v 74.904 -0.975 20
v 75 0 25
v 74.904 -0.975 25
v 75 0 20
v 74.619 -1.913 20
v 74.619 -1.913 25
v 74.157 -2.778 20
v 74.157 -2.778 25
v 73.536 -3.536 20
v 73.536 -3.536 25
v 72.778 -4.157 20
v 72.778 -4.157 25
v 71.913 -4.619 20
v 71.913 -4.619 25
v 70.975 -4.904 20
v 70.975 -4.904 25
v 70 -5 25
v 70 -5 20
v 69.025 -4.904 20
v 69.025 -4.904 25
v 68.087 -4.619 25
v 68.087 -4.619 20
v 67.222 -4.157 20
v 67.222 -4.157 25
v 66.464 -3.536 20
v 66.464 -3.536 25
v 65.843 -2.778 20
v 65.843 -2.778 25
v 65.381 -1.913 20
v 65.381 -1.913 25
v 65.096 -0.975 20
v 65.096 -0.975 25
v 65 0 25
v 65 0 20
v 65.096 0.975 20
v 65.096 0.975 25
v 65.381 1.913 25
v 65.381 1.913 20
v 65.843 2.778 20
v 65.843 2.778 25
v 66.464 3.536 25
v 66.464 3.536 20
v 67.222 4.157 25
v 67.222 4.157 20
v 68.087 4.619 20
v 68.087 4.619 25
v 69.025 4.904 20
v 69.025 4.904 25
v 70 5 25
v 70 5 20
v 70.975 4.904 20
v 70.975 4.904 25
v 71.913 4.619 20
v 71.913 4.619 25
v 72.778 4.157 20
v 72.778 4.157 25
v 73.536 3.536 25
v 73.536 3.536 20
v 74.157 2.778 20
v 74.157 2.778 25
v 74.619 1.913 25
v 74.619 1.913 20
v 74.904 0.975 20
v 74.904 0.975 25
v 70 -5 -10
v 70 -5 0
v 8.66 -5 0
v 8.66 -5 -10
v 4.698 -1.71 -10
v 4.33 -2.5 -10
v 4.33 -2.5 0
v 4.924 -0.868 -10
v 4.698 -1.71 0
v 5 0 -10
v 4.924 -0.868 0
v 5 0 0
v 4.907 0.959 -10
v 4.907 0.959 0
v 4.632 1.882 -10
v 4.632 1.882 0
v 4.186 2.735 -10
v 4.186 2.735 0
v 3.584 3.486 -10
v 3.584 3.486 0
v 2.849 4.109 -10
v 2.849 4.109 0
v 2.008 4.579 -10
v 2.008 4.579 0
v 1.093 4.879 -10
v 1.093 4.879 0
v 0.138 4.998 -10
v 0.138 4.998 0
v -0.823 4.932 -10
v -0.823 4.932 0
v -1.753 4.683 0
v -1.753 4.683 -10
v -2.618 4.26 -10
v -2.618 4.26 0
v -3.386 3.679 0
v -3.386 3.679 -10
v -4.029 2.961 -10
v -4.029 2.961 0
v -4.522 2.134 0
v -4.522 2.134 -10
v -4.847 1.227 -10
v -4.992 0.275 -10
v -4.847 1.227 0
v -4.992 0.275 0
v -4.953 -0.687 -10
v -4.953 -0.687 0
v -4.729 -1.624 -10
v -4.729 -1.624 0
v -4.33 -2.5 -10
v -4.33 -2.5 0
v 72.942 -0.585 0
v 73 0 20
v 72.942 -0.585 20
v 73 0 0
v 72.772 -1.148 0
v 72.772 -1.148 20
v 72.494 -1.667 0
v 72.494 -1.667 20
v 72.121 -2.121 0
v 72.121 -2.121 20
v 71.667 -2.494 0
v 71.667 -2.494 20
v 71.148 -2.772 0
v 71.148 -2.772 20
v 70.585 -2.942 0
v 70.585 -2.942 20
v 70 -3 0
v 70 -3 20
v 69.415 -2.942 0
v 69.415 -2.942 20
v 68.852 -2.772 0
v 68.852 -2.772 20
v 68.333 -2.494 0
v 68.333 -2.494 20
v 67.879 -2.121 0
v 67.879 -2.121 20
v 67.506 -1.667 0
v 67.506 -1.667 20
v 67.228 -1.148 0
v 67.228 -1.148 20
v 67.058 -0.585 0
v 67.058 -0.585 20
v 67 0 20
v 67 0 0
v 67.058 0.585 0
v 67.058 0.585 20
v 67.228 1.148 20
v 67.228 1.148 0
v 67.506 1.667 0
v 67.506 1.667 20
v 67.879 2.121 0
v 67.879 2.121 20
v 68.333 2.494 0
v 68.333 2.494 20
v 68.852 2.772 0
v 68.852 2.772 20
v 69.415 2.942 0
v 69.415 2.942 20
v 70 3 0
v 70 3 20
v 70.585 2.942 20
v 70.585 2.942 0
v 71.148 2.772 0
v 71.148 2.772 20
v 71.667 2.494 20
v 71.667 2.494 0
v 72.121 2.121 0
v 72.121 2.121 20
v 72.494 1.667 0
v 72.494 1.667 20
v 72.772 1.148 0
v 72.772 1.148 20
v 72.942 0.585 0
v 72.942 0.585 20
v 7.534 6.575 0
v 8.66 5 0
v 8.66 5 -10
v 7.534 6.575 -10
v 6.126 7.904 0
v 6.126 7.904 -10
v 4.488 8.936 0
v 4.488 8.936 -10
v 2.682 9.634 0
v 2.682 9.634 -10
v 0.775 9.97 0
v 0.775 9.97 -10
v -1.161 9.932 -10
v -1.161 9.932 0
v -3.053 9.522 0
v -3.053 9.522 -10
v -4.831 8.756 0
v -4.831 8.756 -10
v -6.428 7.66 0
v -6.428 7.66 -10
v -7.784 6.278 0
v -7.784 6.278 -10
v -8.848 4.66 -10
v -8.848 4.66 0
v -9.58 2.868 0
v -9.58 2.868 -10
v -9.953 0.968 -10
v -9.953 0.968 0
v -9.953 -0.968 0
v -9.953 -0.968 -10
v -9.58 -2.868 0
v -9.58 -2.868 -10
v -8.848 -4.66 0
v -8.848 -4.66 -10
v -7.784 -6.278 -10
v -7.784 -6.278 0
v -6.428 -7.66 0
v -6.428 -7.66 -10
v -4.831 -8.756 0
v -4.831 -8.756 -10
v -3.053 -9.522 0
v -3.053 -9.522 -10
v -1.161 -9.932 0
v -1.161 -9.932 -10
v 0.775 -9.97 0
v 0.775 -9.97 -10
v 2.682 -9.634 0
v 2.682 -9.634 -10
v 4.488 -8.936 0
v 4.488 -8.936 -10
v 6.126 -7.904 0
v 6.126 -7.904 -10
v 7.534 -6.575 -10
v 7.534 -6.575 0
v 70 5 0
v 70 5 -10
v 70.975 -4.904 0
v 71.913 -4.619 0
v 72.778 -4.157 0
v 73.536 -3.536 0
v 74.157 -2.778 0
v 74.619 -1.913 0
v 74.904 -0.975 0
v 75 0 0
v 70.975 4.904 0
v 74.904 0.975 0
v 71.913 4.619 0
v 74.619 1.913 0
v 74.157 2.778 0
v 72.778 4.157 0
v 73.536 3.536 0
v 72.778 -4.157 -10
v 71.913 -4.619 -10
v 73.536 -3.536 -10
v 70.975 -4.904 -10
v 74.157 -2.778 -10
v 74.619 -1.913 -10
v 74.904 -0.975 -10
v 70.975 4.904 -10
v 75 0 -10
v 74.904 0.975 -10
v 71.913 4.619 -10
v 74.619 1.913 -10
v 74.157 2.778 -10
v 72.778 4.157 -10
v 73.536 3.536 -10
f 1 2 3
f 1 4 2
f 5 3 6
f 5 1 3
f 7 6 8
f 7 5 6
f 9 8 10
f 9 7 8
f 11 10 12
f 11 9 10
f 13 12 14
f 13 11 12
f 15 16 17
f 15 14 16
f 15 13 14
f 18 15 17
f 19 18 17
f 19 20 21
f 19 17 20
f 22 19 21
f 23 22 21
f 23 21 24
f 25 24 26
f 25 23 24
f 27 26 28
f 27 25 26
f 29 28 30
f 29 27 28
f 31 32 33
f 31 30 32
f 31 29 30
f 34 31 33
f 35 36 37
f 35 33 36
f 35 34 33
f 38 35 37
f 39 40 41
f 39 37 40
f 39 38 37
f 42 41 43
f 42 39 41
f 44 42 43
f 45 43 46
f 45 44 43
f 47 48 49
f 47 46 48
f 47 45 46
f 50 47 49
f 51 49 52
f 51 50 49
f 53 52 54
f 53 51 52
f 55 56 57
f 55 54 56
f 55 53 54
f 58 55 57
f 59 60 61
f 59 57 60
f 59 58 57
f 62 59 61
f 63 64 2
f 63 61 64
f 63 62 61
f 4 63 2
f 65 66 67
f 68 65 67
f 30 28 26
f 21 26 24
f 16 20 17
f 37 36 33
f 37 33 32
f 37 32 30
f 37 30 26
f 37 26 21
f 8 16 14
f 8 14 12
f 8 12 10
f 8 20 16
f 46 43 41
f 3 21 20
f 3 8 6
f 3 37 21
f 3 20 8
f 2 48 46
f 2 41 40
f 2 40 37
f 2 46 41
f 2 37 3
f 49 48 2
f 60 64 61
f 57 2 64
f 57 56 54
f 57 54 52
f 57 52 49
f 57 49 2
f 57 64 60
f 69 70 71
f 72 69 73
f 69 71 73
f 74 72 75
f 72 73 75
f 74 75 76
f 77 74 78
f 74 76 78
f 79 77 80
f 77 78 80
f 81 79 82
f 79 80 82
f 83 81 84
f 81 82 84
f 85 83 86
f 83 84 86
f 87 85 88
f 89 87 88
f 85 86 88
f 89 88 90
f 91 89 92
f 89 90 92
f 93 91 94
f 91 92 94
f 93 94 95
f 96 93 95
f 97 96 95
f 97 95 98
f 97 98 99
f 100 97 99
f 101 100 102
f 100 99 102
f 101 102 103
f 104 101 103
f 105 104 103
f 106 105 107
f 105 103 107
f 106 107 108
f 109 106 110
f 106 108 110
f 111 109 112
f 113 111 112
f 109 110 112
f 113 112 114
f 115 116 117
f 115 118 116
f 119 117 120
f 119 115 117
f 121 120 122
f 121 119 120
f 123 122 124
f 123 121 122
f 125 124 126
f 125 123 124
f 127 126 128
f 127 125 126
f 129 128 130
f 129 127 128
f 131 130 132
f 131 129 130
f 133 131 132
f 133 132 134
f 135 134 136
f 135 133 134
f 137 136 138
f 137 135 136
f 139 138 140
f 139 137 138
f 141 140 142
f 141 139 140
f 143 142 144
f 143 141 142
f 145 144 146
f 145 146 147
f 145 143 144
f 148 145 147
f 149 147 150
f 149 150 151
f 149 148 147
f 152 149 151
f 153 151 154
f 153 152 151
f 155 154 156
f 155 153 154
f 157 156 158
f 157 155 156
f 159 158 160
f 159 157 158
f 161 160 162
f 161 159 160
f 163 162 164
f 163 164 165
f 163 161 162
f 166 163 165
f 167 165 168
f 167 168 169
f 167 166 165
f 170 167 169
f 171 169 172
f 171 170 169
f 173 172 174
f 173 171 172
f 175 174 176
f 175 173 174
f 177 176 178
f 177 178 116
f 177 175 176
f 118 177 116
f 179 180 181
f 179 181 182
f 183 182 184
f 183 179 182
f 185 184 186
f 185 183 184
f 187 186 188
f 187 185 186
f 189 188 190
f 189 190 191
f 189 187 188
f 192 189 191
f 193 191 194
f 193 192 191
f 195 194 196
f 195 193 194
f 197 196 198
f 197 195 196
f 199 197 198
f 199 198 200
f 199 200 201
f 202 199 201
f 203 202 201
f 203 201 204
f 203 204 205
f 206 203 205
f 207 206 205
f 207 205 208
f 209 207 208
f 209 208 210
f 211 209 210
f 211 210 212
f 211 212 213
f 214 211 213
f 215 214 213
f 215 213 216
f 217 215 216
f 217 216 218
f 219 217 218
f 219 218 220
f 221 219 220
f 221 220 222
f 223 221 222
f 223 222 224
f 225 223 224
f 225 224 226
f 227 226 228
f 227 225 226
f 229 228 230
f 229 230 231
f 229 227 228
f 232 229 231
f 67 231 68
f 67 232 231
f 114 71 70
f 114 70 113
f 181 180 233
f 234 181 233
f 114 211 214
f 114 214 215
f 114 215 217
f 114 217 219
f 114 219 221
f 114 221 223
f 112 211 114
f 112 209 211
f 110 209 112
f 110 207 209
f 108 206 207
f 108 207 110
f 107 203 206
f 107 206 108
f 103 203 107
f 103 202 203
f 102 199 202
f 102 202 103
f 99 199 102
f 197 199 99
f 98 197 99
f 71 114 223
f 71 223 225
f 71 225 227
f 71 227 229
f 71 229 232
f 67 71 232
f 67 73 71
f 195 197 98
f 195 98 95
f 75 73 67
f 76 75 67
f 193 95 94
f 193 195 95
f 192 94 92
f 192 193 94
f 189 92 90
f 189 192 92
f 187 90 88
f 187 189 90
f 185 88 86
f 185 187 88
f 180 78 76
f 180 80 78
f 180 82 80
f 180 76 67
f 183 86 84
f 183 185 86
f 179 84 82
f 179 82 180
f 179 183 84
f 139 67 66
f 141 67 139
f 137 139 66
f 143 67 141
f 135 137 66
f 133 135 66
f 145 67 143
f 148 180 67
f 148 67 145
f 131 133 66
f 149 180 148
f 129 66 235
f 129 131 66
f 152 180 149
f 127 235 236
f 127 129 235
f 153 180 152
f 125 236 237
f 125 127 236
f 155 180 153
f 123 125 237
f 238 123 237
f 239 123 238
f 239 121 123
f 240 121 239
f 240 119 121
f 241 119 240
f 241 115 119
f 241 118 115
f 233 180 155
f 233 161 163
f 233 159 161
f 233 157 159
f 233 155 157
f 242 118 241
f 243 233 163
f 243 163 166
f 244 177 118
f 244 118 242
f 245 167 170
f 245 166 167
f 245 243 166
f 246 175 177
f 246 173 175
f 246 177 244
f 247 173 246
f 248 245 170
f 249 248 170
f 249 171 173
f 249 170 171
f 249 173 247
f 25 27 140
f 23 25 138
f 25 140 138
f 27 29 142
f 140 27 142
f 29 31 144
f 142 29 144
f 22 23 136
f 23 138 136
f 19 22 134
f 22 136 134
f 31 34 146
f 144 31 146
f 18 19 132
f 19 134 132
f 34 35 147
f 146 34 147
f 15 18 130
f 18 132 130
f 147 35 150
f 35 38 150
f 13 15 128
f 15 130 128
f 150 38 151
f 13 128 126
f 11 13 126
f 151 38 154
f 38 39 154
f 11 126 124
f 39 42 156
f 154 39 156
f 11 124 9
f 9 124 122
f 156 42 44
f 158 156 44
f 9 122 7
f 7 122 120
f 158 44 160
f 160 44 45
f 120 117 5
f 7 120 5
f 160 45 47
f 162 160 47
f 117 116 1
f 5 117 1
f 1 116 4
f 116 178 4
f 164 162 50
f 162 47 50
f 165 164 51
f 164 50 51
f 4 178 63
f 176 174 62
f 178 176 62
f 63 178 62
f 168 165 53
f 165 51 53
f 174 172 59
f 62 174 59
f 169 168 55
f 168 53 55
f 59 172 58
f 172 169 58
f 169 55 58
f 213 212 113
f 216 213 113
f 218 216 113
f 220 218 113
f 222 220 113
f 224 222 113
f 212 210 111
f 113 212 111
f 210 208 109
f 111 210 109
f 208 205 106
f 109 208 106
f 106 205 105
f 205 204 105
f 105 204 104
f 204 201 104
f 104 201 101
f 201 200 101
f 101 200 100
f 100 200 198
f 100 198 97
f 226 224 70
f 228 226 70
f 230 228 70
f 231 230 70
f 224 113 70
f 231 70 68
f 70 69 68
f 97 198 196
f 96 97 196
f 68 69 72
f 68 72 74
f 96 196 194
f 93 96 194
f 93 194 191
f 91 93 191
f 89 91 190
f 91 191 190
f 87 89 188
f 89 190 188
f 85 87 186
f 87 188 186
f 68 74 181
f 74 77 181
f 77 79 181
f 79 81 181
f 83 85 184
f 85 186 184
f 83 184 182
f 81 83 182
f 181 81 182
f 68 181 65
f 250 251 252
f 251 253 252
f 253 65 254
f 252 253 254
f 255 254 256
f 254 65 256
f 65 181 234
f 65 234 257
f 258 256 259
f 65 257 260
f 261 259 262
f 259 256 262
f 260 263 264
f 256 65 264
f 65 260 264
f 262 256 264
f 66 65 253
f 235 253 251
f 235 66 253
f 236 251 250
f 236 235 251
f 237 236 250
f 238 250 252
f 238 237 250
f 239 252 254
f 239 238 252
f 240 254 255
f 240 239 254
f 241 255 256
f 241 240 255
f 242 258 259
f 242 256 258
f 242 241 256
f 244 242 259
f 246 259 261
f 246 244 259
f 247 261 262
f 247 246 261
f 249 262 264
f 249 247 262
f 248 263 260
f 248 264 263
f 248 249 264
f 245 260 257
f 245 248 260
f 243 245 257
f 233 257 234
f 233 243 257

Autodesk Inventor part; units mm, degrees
ref_plane "YZ Plane" through (0, 0, 0) normal (1, 0, 0) x (0, 1, 0)
ref_plane "XZ Plane" through (0, 0, 0) normal (0, 1, 0) x (-1, 0, 0)
ref_plane "XY Plane" through (0, 0, 0) normal (0, 0, 1) x (1, 0, 0)
sketch "草圖2" plane through (0, 0, 0) normal (0, 0, 1) x (1, 0, 0)
  line L0 (4.3301, -2.5) -> (-4.3301, -2.5)
  arc A0 (4.3301, -2.5) -> (-4.3301, -2.5) centre (0, 0) ccw
  circle A1 centre (0, 0) radius 10
  line L1 (0, 0) -> (70, 0)
  circle A2 centre (70, 0) radius 5
  line L2 (8.6603, 5) -> (70, 5)
  line L3 (70, -5) -> (8.6603, -5)
  circle A3 centre (70, 0) radius 3
  dimension "d2" = 20
  dimension "d3" = 70
  dimension "d4" = 10
  dimension "d7" = 6
extrude "擠出1" add sketch "草圖2" against normal blind 10 contours A1 | A1 L2 A2 L1 | L1 A2 L3 A1 | A3 | A2
extrude "擠出2" add sketch "草圖2" along normal blind 20 contours A3
sketch "草圖3" plane through (70, 0, 20) normal (0, 0, 1) x (1, 0, 0)
  circle A0 centre (0, 0) radius 5
  point P0 (-70, 0)
  dimension "d10" = 10
extrude "擠出3" add sketch "草圖3" along normal blind 5
properties part number "Cranker1"
